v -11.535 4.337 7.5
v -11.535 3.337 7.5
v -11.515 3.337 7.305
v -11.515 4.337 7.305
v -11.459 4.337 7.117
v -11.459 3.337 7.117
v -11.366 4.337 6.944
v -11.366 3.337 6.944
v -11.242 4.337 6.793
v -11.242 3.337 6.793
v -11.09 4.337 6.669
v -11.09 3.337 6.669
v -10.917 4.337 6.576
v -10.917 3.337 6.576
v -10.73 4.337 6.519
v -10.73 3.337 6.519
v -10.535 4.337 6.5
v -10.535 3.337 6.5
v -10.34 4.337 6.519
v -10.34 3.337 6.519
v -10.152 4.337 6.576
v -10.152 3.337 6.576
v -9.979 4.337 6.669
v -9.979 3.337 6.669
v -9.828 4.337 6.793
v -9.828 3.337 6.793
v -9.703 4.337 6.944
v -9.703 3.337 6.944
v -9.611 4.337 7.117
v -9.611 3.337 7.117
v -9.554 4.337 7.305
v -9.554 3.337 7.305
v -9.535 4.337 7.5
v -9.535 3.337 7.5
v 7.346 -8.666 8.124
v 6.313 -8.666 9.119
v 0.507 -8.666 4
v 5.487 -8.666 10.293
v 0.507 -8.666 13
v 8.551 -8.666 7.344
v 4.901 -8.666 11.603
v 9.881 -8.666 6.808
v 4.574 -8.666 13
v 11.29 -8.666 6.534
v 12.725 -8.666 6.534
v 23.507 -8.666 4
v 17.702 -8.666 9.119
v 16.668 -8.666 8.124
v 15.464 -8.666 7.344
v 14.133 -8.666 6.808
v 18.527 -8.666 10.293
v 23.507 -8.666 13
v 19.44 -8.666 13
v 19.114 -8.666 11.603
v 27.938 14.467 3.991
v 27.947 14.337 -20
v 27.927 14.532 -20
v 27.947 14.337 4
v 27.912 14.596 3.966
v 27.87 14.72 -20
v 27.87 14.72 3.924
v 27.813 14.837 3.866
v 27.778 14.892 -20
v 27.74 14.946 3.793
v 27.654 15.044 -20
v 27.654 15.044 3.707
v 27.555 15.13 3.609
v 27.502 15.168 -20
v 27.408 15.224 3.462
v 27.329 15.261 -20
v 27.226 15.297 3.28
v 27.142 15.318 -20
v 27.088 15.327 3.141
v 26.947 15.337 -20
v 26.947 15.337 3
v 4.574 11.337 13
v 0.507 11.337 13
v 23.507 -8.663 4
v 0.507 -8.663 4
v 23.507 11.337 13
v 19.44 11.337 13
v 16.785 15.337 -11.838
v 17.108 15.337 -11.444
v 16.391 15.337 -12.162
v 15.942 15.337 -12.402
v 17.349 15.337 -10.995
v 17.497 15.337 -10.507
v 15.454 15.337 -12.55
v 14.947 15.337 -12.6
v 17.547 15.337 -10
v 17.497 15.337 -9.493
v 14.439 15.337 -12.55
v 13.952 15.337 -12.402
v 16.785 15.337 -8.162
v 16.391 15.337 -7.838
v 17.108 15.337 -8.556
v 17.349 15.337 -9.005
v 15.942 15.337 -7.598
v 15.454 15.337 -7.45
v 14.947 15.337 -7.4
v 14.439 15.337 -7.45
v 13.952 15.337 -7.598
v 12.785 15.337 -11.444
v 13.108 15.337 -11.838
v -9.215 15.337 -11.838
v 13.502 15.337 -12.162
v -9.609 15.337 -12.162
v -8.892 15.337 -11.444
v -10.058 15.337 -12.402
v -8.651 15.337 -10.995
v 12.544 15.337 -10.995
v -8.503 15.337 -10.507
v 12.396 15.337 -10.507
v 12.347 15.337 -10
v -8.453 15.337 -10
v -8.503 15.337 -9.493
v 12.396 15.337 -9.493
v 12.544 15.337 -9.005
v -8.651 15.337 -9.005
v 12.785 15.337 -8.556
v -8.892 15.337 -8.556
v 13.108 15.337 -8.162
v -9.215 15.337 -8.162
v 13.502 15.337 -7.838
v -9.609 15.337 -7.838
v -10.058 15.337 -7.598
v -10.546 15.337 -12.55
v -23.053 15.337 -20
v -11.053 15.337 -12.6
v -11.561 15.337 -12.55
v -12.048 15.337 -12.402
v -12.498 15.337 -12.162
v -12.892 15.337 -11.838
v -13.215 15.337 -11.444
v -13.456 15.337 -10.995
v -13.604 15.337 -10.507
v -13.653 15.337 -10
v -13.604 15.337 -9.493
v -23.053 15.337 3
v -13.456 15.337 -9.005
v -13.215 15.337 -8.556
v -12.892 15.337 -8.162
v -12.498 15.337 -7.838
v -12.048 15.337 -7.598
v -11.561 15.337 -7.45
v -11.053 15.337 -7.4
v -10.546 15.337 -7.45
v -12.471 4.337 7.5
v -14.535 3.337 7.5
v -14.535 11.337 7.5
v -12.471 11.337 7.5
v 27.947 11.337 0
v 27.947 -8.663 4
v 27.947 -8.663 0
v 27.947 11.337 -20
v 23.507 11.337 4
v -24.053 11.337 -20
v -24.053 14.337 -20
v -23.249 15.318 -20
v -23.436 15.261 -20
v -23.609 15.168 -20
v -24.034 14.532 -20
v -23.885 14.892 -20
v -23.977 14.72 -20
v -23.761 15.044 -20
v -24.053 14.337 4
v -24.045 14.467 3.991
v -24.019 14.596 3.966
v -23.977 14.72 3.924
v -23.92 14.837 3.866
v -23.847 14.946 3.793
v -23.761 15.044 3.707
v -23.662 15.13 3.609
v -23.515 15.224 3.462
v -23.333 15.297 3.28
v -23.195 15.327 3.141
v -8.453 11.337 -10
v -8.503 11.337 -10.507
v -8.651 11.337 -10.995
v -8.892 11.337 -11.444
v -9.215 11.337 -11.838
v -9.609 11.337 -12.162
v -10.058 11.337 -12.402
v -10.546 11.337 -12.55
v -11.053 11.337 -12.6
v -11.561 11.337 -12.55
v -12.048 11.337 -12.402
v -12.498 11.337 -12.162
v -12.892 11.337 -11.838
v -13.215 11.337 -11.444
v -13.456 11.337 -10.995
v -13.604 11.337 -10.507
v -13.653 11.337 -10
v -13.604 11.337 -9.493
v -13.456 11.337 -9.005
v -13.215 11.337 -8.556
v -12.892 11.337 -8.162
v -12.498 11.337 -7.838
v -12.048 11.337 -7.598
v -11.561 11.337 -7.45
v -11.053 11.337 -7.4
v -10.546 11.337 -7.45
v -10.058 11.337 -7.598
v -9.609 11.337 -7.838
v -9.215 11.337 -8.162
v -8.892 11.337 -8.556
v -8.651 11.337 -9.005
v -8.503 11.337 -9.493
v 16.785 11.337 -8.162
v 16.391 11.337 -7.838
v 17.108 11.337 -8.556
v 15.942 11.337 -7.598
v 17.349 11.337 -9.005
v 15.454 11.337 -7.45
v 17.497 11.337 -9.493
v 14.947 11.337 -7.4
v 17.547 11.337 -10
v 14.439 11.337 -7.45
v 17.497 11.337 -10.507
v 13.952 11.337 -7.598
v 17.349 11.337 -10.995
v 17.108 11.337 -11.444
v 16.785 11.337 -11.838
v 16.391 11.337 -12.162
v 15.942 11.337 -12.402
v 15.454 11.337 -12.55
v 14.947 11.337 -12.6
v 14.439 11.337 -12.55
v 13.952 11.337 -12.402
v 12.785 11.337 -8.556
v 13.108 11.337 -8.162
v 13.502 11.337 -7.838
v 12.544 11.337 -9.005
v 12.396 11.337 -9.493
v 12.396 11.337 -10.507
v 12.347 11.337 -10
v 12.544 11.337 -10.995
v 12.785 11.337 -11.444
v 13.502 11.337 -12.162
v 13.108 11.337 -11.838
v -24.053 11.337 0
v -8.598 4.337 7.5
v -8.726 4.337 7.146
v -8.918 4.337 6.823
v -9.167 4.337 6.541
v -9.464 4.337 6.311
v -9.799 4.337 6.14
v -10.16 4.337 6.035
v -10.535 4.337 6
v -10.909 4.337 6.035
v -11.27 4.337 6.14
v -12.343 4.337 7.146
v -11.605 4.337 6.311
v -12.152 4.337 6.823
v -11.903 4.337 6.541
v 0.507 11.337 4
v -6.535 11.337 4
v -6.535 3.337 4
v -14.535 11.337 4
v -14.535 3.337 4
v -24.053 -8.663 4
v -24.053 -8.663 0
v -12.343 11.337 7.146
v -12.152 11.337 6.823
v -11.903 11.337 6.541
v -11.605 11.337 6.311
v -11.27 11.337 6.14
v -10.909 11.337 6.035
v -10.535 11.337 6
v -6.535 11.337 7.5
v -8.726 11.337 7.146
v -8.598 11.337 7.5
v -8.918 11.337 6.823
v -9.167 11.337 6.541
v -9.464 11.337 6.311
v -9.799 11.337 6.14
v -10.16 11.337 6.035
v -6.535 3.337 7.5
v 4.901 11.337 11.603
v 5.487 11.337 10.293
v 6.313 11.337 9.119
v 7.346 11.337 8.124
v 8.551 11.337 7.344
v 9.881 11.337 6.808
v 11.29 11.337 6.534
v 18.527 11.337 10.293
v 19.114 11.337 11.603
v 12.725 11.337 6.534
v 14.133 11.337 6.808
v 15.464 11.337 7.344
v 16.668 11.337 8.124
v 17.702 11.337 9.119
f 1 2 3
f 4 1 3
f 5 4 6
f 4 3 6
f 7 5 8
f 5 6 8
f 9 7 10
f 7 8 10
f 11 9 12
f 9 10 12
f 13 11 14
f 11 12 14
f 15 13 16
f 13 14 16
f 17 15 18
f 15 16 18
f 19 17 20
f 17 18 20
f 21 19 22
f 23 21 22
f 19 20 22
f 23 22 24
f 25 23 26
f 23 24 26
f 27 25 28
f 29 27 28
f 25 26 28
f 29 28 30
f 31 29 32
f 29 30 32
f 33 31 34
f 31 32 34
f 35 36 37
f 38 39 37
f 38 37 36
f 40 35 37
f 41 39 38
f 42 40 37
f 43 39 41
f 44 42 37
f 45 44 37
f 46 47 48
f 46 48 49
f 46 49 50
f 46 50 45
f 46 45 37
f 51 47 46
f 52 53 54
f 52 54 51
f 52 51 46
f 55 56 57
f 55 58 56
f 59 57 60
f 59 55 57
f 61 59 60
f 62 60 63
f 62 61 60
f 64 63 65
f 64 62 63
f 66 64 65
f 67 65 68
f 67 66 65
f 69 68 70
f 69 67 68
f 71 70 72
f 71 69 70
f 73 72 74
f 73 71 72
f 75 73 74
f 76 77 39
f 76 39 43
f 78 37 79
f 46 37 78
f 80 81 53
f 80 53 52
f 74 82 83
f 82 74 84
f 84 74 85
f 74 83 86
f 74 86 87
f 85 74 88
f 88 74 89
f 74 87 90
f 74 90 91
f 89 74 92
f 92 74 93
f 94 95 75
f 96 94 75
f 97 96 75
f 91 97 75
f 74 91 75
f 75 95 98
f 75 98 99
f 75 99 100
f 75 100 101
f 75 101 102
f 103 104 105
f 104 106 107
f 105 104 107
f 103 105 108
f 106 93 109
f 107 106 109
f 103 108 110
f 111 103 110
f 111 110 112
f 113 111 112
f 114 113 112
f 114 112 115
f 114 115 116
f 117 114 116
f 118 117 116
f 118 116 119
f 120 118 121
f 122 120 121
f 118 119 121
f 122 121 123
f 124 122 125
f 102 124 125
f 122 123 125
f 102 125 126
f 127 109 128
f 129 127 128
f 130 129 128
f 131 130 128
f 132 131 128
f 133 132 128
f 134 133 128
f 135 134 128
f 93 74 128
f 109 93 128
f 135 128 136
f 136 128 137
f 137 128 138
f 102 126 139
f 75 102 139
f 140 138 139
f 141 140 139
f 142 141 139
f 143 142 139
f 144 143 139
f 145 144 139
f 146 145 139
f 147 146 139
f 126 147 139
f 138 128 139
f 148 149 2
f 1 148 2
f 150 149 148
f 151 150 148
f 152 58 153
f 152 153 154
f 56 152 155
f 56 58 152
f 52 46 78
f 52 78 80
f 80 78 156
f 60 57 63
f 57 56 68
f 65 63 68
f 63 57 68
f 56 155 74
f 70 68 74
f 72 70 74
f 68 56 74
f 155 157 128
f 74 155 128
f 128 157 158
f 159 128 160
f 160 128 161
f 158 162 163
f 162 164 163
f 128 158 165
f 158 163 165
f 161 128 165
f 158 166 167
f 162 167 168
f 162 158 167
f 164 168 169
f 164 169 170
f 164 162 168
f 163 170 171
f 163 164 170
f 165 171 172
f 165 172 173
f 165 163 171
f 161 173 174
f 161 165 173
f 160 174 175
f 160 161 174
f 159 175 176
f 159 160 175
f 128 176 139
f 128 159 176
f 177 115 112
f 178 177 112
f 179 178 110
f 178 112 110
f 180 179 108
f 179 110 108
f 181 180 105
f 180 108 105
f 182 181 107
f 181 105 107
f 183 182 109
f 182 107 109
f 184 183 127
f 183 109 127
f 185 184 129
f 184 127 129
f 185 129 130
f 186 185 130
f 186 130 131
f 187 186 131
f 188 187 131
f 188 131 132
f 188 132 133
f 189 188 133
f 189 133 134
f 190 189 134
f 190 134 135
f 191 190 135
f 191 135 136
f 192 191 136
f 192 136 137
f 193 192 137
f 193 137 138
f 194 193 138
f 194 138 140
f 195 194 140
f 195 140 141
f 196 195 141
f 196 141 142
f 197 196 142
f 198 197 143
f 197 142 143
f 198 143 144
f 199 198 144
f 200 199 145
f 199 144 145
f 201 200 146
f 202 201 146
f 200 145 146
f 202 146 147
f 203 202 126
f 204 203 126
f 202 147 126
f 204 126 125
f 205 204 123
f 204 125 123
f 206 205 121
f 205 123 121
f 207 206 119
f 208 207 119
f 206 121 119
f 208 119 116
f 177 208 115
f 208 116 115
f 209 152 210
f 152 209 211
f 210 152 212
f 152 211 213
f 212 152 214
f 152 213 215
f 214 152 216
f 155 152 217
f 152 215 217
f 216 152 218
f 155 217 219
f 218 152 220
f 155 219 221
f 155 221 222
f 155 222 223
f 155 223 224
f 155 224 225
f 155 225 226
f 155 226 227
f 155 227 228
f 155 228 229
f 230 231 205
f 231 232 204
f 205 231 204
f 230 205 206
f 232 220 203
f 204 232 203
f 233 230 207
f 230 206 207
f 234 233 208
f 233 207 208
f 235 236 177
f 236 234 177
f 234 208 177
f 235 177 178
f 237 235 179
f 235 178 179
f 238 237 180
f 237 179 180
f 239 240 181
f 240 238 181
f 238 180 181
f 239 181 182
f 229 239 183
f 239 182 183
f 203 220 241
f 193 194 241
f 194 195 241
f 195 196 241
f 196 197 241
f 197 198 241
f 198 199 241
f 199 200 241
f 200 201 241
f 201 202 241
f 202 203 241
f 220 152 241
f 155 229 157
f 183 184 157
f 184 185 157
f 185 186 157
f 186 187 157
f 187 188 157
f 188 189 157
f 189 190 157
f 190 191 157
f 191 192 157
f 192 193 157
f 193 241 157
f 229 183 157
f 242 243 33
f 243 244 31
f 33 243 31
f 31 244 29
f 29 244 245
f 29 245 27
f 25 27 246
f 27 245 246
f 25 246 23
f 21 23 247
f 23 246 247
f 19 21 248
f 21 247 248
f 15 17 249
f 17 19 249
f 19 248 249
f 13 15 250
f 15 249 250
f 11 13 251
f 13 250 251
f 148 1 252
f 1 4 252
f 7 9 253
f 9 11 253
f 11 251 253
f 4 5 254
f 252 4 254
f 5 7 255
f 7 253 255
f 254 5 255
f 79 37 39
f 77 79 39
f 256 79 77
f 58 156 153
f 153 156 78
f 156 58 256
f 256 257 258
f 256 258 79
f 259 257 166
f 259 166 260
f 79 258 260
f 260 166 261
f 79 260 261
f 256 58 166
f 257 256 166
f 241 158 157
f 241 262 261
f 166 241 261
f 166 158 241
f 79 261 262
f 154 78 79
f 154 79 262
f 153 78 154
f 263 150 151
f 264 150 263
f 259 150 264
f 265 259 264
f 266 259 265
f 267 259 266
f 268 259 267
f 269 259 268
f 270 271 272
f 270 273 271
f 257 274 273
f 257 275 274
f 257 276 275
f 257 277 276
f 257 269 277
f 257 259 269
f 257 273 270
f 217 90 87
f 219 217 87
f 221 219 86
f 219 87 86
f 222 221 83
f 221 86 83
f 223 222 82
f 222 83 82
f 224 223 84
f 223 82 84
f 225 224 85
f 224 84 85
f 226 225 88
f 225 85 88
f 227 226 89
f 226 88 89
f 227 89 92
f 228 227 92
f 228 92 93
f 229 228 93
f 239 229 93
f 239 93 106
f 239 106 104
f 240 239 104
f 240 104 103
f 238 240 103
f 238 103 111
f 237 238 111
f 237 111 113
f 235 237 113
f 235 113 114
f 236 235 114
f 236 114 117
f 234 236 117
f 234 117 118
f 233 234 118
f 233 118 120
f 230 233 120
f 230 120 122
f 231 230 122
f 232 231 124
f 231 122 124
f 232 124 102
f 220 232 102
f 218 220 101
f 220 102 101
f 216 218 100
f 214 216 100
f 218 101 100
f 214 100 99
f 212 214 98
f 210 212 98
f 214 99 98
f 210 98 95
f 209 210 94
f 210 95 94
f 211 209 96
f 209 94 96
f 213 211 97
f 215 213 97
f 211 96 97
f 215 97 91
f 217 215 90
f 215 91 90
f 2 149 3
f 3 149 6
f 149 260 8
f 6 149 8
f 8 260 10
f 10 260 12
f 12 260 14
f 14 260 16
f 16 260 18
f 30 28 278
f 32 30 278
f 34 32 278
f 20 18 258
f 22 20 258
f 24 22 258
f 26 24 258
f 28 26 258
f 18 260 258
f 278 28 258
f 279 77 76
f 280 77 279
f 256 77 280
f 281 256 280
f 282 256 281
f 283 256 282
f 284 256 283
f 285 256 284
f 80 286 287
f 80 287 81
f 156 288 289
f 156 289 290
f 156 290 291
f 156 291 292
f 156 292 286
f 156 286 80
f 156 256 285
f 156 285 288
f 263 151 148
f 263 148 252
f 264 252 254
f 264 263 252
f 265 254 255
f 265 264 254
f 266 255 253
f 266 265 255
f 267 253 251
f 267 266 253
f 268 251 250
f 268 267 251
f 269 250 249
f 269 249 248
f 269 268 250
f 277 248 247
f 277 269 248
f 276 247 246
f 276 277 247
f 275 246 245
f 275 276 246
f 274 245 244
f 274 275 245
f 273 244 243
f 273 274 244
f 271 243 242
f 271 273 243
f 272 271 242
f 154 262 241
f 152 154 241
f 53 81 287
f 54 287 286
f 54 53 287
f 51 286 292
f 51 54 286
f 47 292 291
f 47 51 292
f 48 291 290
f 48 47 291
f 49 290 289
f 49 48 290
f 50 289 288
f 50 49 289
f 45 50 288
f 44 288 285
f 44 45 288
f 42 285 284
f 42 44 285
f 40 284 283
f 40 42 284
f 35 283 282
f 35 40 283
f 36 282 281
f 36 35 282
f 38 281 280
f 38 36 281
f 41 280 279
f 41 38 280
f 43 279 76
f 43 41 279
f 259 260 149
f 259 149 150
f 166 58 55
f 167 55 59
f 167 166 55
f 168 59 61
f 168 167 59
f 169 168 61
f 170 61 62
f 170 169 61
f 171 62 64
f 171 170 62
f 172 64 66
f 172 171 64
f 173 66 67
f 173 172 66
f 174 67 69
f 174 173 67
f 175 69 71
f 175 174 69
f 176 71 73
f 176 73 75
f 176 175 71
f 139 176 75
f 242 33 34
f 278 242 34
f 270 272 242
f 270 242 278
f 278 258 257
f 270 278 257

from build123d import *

# Parameters (mm, degrees)
SKETCH_1_W                = 40
SKETCH_1_H                = 40
EXTRUDE_1_DEPTH           = 4
SKETCH_2_W                = 40
SKETCH_2_H                = 4
EXTRUDE_2_DEPTH           = 4
SKETCH_3_W                = 40
SKETCH_3_H                = 4
EXTRUDE_3_DEPTH           = 20
SKETCH_4_W                = 8
SKETCH_4_H                = 12
EXTRUDE_4_DEPTH           = 4
CUT_EXTRUDE_1_DEPTH       = 11
EXTRUDE_5_DEPTH           = 4
EXTRUDE_6_DEPTH           = 4
EXTRUDE_7_DEPTH           = 4
SKETCH_10_W               = 23
SKETCH_10_H               = 24.293070416
EXTRUDE_8_DEPTH           = 10
CUT_EXTRUDE_3_DEPTH       = 25.293070415
SKETCH_14_W               = 8
SKETCH_14_H               = 0.5
CUT_EXTRUDE_4_DEPTH       = 45
SKETCH_15_W               = 23
SKETCH_15_H               = 1
CUT_EXTRUDE_5_DEPTH       = 45
SKETCH_16_R               = 2.6
CUT_EXTRUDE_6_DEPTH       = 7
SKETCH_17_W               = 52
SKETCH_17_H               = 4
CUT_EXTRUDE_7_DEPTH       = 20
CUT_EXTRUDE_8_DEPTH       = 0.29
SKETCH_20_R               = 1
CUT_EXTRUDE_9_DEPTH       = 11
CUT_EXTRUDE_10_DEPTH      = 1
CUT_EXTRUDE_10_DEPTH_BACK = 4
FILLET_1_R                = 1


with BuildPart() as part:
    # 草图1 → 凸台-拉伸1 (new body)
    with BuildSketch(Plane.XY):
        with Locations((-0.053475936, -8.663101604)):
            Rectangle(SKETCH_1_W, SKETCH_1_H)
    extrude(amount=EXTRUDE_1_DEPTH)

    # 草图2 → 凸台-拉伸2 (add)
    with BuildSketch(Plane(origin=(0, 11.336898396, 0), x_dir=(1, 0, 0), z_dir=(0, 1, 0))):
        with Locations((-0.053475936, -2)):
            Rectangle(SKETCH_2_W, SKETCH_2_H)
    extrude(amount=EXTRUDE_2_DEPTH)

    # 草图3 → 凸台-拉伸3 (add)
    with BuildSketch(Plane(origin=(0, 0, 0), x_dir=(-1, 0, 0), z_dir=(0, 0, -1))):
        with Locations((0.053475936, 13.336898396)):
            Rectangle(SKETCH_3_W, SKETCH_3_H)
    extrude(amount=EXTRUDE_3_DEPTH)

    # 草图4 → 凸台-拉伸4 (add)
    with BuildSketch(Plane.XY.offset(4)):
        with Locations((-10.534642548, 9.336898396)):
            Rectangle(SKETCH_4_W, SKETCH_4_H)
    extrude(amount=EXTRUDE_4_DEPTH)

    # 草图6 → 切除-拉伸1 (cut)
    with BuildSketch(Plane(origin=(0, 15.336898396, 0), x_dir=(1, 0, 0), z_dir=(0, 1, 0))):
        with BuildLine():
            Line((-8.534642548, -8), (-12.534642548, -8))
            ThreePointArc((-12.534642548, -8), (-10.534642548, -6), (-8.534642548, -8))
        make_face()
    extrude(amount=-CUT_EXTRUDE_1_DEPTH, mode=Mode.SUBTRACT)

    # 草图8 → 凸台-拉伸5 (add)
    with BuildSketch(Plane.ZY.offset(20.053475936)):
        Polygon((4, 15.336898396), (-20, 15.336898396), (-20, 11.336898396), (0, 11.336898396), (0, -28.663101604), (4, -28.663101604), align=None)
    extrude(amount=EXTRUDE_5_DEPTH)

    # 草图9 → 凸台-拉伸6 (add)
    with BuildSketch(Plane(origin=(19.946524064, 0, 0), x_dir=(0, 0, -1), z_dir=(1, 0, 0))):
        Polygon((0, -28.663101604), (0, 11.336898396), (20, 11.336898396), (20, 15.336898396), (-4, 15.336898396), (-4, -28.663101604), align=None)
    extrude(amount=EXTRUDE_6_DEPTH)

    # 草图11 → 凸台-拉伸7 (add)
    with BuildSketch(Plane(origin=(23.946524064, 0, 0), x_dir=(0, 0, -1), z_dir=(1, 0, 0))):
        Polygon((-4, -28.663101604), (0, -28.663101604), (0, 11.336898396), (20, 11.336898396), (20, 15.336898396), (-4, 15.336898396), align=None)
    extrude(amount=EXTRUDE_7_DEPTH)

    # 草图10 → 凸台-拉伸8 (add)
    with BuildSketch(Plane.XY.offset(4)):
        with Locations((12.007361252, 3.190363188)):
            Rectangle(SKETCH_10_W, SKETCH_10_H)
    extrude(amount=EXTRUDE_8_DEPTH)

    # 草图12 → 切除-拉伸3 (cut, through all)
    with BuildSketch(Plane.XZ.offset(8.95617202)):
        with BuildLine():
            Line((4.507361252, 14), (19.507361252, 14))
            ThreePointArc((19.507361252, 14), (12.007361252, 6.5), (4.507361252, 14))
        make_face()
    extrude(amount=-CUT_EXTRUDE_3_DEPTH, mode=Mode.SUBTRACT)

    # 草图14 → 切除-拉伸4 (cut, through all)
    with BuildSketch(Plane(origin=(0, 15.336898396, 0), x_dir=(1, 0, 0), z_dir=(0, 1, 0))):
        with Locations((-10.534642548, -7.75)):
            Rectangle(SKETCH_14_W, SKETCH_14_H)
    extrude(amount=-CUT_EXTRUDE_4_DEPTH, mode=Mode.SUBTRACT)

    # 草图15 → 切除-拉伸5 (cut, through all)
    with BuildSketch(Plane(origin=(0, 15.336898396, 0), x_dir=(1, 0, 0), z_dir=(0, 1, 0))):
        with Locations((12.007361252, -13.5)):
            Rectangle(SKETCH_15_W, SKETCH_15_H)
    extrude(amount=-CUT_EXTRUDE_5_DEPTH, mode=Mode.SUBTRACT)

    # 草图16 → 切除-拉伸6 (cut)
    with BuildSketch(Plane(origin=(0, 15.336898396, 0), x_dir=(1, 0, 0), z_dir=(0, 1, 0))):
        with Locations((-11.053475936, 10)):
            Circle(SKETCH_16_R)
        with Locations((14.946524064, 10)):
            Circle(SKETCH_16_R)
    extrude(amount=-CUT_EXTRUDE_6_DEPTH, mode=Mode.SUBTRACT)

    # 草图17 → 切除-拉伸7 (cut)
    with BuildSketch(Plane.XZ.offset(28.663101604)):
        with Locations((1.946524064, 2)):
            Rectangle(SKETCH_17_W, SKETCH_17_H)
    extrude(amount=-CUT_EXTRUDE_7_DEPTH, mode=Mode.SUBTRACT)

    # 草图19 → 切除-拉伸8 (cut)
    with BuildSketch(Plane.XZ.offset(8.95617202)):
        with BuildLine():
            Line((23.507361252, 4), (23.507361252, 13))
            Line((23.507361252, 13), (19.440395626, 13))
            ThreePointArc((19.440395626, 13), (12.007361252, 6.5), (4.574326878, 13))
            Line((4.574326878, 13), (0.507361252, 13))
            Line((0.507361252, 13), (0.507361252, 4))
            Line((0.507361252, 4), (23.507361252, 4))
        make_face()
    extrude(amount=-CUT_EXTRUDE_8_DEPTH, mode=Mode.SUBTRACT)

    # 草图20 → 切除-拉伸9 (cut)
    with BuildSketch(Plane(origin=(0, 3.336898396, 0), x_dir=(-1, 0, 0), z_dir=(0, -1, 0))):
        with Locations((10.534642548, -7.5)):
            Circle(SKETCH_20_R)
    extrude(amount=-CUT_EXTRUDE_9_DEPTH, mode=Mode.SUBTRACT)

    # 草图21 → 切除-拉伸10 (cut, two sides)
    with BuildSketch(Plane(origin=(0, 15.336898396, 0), x_dir=(1, 0, 0), z_dir=(0, 1, 0))) as cut_extrude_10_sk:
        Polygon((152.48909257, -4), (27.946524064, -4), (-24.053475936, -4), (-148.596044442, -4), (-148.596044442, -253.085137012), (152.48909257, -253.085137012), align=None)
    extrude(amount=CUT_EXTRUDE_10_DEPTH, mode=Mode.SUBTRACT)
    extrude(cut_extrude_10_sk.sketch, amount=-CUT_EXTRUDE_10_DEPTH_BACK, mode=Mode.SUBTRACT)

    # 圆角1
    fillet_1_edges = [part.edges().sort_by_distance(p)[0] for p in [
        (1.946524064, 15.336898396, 4),
        (-24.053475936, 15.336898396, -8),
        (27.946524064, 15.336898396, -8),
    ]]
    fillet(fillet_1_edges, radius=FILLET_1_R)


solid = part.part
